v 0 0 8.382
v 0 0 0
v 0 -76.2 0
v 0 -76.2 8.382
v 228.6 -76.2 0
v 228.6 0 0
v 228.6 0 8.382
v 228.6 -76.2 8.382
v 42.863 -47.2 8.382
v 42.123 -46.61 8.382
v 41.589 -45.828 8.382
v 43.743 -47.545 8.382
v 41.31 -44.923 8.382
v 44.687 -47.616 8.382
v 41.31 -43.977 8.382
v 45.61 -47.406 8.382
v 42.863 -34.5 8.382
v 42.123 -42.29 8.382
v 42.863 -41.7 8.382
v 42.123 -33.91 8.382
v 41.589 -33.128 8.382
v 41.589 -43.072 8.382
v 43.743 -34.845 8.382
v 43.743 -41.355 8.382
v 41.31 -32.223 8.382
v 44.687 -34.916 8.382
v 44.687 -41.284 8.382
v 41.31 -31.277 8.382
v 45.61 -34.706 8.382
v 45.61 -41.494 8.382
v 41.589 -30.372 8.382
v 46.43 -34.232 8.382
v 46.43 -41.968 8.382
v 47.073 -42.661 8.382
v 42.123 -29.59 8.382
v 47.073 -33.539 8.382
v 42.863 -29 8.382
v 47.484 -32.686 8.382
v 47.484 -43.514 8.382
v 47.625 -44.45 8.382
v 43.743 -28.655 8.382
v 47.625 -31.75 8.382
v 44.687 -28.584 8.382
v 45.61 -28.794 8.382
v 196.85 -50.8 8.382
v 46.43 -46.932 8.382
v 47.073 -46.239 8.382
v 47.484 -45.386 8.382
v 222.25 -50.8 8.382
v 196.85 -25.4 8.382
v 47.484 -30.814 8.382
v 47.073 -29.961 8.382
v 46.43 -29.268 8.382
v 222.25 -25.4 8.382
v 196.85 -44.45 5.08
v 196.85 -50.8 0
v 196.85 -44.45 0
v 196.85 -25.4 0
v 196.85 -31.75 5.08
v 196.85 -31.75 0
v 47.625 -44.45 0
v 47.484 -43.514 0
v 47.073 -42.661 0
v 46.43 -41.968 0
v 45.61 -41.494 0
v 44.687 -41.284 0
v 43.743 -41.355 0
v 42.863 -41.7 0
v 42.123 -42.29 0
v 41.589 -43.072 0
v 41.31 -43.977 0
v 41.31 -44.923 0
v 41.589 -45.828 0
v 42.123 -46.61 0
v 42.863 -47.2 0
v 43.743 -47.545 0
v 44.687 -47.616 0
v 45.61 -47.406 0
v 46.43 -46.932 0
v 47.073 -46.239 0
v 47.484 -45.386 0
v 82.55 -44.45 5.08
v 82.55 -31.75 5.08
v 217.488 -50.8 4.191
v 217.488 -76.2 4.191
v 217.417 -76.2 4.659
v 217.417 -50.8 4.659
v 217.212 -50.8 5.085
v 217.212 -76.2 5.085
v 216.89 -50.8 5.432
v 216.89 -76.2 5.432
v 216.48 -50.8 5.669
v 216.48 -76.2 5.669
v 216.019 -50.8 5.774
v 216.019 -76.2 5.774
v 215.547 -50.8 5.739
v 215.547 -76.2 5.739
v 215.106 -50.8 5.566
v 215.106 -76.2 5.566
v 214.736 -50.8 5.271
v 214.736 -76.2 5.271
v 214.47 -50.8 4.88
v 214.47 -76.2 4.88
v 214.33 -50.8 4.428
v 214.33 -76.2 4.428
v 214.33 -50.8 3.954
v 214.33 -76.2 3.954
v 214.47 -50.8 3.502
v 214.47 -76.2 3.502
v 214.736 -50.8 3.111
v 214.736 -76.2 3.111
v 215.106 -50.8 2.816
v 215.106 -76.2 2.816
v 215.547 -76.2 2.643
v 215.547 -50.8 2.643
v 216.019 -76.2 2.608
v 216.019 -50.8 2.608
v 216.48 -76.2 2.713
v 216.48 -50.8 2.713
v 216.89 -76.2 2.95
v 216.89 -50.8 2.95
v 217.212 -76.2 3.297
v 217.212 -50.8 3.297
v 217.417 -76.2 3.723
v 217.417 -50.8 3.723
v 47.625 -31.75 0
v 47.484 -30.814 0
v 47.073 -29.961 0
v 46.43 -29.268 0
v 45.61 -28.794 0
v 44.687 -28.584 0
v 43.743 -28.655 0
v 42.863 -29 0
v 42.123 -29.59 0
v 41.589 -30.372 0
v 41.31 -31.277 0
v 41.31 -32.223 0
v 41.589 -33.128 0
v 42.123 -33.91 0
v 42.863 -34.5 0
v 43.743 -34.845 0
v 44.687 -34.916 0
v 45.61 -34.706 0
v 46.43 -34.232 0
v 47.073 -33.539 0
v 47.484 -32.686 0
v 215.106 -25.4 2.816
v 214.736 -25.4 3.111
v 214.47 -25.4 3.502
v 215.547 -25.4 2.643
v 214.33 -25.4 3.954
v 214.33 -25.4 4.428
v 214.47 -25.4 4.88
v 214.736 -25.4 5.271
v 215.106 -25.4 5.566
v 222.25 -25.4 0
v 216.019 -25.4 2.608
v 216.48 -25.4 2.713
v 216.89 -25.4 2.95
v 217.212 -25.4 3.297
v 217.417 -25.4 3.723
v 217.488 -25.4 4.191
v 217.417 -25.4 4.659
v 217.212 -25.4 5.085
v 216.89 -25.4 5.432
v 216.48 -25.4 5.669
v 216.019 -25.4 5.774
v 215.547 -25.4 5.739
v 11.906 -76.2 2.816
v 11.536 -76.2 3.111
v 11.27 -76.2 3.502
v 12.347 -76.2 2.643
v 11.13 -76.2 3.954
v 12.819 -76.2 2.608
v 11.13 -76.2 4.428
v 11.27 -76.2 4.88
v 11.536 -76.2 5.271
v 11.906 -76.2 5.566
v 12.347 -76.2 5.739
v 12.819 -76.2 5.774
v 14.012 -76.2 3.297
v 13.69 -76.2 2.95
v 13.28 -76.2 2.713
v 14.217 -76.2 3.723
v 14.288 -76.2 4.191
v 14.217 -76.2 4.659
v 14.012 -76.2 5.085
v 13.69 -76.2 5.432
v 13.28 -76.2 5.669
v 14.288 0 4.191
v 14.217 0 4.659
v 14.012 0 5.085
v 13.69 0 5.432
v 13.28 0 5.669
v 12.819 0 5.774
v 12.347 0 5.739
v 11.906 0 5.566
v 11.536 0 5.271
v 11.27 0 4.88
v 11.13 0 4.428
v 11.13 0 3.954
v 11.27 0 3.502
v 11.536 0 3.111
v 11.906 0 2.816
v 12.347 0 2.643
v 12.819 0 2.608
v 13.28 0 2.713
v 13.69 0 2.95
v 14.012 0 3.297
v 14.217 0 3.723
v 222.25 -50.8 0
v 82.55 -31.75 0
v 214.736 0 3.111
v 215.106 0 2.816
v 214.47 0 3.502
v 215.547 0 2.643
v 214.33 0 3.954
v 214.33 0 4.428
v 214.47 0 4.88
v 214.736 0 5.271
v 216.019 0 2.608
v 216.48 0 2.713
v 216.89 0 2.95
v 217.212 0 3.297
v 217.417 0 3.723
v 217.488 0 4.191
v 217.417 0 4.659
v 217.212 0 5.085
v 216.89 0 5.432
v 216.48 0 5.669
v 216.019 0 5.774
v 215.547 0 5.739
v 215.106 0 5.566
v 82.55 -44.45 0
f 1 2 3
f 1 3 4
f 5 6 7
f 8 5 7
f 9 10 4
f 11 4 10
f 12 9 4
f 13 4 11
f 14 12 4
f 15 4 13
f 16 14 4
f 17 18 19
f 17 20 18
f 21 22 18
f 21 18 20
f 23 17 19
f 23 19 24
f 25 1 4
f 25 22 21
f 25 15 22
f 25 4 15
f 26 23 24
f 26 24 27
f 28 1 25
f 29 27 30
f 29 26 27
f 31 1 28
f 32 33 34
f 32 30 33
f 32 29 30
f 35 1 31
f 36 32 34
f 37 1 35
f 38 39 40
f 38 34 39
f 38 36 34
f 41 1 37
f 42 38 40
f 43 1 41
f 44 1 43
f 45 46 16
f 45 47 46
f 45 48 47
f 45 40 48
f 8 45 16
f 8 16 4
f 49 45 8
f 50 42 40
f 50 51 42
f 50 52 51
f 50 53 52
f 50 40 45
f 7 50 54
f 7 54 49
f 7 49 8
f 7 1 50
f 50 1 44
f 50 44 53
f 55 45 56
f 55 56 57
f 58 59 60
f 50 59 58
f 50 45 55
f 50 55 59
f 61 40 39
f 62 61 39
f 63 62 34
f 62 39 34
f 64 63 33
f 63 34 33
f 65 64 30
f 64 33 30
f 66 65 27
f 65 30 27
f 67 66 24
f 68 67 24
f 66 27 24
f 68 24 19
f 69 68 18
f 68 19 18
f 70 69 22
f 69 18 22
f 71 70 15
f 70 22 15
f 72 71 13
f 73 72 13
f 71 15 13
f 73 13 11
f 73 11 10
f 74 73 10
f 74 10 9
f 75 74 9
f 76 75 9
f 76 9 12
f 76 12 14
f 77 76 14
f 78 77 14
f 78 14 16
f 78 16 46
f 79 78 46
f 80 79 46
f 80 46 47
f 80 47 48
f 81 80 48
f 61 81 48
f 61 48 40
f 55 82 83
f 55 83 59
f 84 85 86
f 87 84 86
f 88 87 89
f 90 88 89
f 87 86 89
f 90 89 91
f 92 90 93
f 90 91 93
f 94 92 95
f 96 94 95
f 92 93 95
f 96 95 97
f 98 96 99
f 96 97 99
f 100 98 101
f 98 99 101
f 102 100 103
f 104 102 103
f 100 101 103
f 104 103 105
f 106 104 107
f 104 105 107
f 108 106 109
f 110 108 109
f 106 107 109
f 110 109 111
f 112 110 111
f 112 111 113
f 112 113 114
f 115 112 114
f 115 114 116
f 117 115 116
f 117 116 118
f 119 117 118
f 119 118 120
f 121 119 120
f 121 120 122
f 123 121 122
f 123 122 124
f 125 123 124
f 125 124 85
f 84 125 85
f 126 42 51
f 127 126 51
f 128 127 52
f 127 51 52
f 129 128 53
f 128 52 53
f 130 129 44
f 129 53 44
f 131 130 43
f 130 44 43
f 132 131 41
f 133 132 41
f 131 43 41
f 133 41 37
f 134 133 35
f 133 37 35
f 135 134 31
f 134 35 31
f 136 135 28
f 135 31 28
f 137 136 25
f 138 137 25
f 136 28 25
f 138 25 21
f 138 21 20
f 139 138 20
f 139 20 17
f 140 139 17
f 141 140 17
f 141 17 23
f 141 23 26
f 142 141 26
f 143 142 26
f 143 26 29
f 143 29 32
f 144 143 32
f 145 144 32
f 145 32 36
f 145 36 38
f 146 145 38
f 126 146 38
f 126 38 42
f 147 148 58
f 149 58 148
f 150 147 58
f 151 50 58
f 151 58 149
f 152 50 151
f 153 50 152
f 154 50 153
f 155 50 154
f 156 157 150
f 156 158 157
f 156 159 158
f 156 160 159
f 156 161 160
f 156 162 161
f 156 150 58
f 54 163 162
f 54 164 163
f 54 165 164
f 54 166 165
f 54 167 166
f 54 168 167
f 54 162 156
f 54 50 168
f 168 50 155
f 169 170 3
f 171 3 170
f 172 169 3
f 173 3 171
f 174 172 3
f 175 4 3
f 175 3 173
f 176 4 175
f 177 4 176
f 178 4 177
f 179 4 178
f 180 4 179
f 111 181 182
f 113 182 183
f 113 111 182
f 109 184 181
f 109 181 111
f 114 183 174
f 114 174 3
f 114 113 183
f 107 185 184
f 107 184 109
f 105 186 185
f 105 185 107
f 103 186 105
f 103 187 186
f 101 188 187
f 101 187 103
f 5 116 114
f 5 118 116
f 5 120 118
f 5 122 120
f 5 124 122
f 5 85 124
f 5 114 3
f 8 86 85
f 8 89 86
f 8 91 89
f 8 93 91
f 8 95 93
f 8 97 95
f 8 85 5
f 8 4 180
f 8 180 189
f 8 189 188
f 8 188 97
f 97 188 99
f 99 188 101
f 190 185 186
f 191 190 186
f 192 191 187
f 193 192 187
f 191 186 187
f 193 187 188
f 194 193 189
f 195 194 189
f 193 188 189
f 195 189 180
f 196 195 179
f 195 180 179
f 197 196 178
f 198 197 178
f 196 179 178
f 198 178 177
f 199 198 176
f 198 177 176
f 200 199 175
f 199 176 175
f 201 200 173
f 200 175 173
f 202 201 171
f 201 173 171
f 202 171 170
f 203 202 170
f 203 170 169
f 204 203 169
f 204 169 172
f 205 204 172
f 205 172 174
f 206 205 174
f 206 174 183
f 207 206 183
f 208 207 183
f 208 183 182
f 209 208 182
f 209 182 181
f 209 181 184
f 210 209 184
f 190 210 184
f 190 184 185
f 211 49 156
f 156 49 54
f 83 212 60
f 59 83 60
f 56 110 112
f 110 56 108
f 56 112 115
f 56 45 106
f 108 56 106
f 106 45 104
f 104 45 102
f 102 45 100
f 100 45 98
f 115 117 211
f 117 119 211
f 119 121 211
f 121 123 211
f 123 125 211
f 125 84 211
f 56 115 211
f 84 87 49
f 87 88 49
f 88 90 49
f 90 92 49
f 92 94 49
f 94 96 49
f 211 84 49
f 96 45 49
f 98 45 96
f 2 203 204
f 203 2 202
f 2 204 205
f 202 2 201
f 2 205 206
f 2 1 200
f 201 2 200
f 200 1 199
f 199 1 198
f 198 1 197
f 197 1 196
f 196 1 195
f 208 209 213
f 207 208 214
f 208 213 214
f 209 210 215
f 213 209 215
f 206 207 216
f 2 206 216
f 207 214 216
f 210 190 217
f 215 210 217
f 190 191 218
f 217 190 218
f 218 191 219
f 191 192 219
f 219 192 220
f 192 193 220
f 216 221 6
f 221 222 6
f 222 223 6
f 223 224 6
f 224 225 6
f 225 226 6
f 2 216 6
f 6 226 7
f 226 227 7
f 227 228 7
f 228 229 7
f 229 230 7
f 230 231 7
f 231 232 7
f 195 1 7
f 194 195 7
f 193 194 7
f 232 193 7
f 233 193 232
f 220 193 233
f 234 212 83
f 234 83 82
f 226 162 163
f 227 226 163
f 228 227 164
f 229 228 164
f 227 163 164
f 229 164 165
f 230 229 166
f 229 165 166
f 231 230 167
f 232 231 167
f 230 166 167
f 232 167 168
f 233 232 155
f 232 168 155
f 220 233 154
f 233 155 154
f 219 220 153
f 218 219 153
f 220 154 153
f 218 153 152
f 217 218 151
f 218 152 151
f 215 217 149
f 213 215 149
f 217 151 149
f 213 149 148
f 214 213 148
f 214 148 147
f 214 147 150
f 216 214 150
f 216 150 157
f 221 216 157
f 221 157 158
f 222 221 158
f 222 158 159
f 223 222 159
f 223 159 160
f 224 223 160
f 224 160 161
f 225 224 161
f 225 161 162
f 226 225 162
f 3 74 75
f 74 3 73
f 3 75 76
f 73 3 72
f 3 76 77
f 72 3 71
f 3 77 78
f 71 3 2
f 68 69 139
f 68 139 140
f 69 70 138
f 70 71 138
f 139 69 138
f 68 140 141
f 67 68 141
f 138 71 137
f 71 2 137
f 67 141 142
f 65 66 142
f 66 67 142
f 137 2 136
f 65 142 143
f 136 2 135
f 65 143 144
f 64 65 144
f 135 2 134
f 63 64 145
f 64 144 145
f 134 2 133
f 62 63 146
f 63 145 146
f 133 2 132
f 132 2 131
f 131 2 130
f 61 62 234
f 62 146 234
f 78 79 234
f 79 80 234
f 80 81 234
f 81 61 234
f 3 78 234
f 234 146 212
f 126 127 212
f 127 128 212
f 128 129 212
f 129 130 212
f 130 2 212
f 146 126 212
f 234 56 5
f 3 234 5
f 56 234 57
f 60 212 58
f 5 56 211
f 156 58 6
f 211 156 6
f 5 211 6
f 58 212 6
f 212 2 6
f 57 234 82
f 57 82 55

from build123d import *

# Parameters (mm, degrees)
F0_W     = 228.6
F0_H     = 8.382
F1_DEPTH = 76.2
F2_R     = 1.5875
F3_DEPTH = 76.201
F4_W     = 25.4
F4_H     = 25.4
F4_R     = 3.175
F5_DEPTH = 8.383
F6_W     = 114.3
F6_H     = 12.7
F7_DEPTH = 5.08


with BuildPart() as f1:
    # F0 (on Front) → F1 (new body)
    with BuildSketch(Plane.XZ):
        with Locations((114.3, 4.191)):
            Rectangle(F0_W, F0_H)
    extrude(amount=F1_DEPTH)

    # F2 (on face) → F3 (cut, through all)
    with BuildSketch(Plane.XZ.offset(76.2)):
        with Locations((12.7, 4.191)):
            Circle(F2_R)
        with Locations((215.9, 4.191)):
            Circle(F2_R)
    extrude(amount=-F3_DEPTH, mode=Mode.SUBTRACT)

    # F4 (on face) → F5 (cut, through all)
    with BuildSketch(Plane.XY.offset(8.382)):
        with Locations((209.55, -38.1)):
            Rectangle(F4_W, F4_H)
        with Locations((44.45, -31.75)):
            Circle(F4_R)
        with Locations((44.45, -44.45)):
            Circle(F4_R)
    extrude(amount=-F5_DEPTH, mode=Mode.SUBTRACT)

    # F6 (on face) → F7 (cut)
    with BuildSketch(Plane(origin=(0, 0, 0), x_dir=(1, 0, 0), z_dir=(0, 0, -1))):
        with Locations((139.7, 38.1)):
            Rectangle(F6_W, F6_H)
    extrude(amount=-F7_DEPTH, mode=Mode.SUBTRACT)


solid = f1.part
